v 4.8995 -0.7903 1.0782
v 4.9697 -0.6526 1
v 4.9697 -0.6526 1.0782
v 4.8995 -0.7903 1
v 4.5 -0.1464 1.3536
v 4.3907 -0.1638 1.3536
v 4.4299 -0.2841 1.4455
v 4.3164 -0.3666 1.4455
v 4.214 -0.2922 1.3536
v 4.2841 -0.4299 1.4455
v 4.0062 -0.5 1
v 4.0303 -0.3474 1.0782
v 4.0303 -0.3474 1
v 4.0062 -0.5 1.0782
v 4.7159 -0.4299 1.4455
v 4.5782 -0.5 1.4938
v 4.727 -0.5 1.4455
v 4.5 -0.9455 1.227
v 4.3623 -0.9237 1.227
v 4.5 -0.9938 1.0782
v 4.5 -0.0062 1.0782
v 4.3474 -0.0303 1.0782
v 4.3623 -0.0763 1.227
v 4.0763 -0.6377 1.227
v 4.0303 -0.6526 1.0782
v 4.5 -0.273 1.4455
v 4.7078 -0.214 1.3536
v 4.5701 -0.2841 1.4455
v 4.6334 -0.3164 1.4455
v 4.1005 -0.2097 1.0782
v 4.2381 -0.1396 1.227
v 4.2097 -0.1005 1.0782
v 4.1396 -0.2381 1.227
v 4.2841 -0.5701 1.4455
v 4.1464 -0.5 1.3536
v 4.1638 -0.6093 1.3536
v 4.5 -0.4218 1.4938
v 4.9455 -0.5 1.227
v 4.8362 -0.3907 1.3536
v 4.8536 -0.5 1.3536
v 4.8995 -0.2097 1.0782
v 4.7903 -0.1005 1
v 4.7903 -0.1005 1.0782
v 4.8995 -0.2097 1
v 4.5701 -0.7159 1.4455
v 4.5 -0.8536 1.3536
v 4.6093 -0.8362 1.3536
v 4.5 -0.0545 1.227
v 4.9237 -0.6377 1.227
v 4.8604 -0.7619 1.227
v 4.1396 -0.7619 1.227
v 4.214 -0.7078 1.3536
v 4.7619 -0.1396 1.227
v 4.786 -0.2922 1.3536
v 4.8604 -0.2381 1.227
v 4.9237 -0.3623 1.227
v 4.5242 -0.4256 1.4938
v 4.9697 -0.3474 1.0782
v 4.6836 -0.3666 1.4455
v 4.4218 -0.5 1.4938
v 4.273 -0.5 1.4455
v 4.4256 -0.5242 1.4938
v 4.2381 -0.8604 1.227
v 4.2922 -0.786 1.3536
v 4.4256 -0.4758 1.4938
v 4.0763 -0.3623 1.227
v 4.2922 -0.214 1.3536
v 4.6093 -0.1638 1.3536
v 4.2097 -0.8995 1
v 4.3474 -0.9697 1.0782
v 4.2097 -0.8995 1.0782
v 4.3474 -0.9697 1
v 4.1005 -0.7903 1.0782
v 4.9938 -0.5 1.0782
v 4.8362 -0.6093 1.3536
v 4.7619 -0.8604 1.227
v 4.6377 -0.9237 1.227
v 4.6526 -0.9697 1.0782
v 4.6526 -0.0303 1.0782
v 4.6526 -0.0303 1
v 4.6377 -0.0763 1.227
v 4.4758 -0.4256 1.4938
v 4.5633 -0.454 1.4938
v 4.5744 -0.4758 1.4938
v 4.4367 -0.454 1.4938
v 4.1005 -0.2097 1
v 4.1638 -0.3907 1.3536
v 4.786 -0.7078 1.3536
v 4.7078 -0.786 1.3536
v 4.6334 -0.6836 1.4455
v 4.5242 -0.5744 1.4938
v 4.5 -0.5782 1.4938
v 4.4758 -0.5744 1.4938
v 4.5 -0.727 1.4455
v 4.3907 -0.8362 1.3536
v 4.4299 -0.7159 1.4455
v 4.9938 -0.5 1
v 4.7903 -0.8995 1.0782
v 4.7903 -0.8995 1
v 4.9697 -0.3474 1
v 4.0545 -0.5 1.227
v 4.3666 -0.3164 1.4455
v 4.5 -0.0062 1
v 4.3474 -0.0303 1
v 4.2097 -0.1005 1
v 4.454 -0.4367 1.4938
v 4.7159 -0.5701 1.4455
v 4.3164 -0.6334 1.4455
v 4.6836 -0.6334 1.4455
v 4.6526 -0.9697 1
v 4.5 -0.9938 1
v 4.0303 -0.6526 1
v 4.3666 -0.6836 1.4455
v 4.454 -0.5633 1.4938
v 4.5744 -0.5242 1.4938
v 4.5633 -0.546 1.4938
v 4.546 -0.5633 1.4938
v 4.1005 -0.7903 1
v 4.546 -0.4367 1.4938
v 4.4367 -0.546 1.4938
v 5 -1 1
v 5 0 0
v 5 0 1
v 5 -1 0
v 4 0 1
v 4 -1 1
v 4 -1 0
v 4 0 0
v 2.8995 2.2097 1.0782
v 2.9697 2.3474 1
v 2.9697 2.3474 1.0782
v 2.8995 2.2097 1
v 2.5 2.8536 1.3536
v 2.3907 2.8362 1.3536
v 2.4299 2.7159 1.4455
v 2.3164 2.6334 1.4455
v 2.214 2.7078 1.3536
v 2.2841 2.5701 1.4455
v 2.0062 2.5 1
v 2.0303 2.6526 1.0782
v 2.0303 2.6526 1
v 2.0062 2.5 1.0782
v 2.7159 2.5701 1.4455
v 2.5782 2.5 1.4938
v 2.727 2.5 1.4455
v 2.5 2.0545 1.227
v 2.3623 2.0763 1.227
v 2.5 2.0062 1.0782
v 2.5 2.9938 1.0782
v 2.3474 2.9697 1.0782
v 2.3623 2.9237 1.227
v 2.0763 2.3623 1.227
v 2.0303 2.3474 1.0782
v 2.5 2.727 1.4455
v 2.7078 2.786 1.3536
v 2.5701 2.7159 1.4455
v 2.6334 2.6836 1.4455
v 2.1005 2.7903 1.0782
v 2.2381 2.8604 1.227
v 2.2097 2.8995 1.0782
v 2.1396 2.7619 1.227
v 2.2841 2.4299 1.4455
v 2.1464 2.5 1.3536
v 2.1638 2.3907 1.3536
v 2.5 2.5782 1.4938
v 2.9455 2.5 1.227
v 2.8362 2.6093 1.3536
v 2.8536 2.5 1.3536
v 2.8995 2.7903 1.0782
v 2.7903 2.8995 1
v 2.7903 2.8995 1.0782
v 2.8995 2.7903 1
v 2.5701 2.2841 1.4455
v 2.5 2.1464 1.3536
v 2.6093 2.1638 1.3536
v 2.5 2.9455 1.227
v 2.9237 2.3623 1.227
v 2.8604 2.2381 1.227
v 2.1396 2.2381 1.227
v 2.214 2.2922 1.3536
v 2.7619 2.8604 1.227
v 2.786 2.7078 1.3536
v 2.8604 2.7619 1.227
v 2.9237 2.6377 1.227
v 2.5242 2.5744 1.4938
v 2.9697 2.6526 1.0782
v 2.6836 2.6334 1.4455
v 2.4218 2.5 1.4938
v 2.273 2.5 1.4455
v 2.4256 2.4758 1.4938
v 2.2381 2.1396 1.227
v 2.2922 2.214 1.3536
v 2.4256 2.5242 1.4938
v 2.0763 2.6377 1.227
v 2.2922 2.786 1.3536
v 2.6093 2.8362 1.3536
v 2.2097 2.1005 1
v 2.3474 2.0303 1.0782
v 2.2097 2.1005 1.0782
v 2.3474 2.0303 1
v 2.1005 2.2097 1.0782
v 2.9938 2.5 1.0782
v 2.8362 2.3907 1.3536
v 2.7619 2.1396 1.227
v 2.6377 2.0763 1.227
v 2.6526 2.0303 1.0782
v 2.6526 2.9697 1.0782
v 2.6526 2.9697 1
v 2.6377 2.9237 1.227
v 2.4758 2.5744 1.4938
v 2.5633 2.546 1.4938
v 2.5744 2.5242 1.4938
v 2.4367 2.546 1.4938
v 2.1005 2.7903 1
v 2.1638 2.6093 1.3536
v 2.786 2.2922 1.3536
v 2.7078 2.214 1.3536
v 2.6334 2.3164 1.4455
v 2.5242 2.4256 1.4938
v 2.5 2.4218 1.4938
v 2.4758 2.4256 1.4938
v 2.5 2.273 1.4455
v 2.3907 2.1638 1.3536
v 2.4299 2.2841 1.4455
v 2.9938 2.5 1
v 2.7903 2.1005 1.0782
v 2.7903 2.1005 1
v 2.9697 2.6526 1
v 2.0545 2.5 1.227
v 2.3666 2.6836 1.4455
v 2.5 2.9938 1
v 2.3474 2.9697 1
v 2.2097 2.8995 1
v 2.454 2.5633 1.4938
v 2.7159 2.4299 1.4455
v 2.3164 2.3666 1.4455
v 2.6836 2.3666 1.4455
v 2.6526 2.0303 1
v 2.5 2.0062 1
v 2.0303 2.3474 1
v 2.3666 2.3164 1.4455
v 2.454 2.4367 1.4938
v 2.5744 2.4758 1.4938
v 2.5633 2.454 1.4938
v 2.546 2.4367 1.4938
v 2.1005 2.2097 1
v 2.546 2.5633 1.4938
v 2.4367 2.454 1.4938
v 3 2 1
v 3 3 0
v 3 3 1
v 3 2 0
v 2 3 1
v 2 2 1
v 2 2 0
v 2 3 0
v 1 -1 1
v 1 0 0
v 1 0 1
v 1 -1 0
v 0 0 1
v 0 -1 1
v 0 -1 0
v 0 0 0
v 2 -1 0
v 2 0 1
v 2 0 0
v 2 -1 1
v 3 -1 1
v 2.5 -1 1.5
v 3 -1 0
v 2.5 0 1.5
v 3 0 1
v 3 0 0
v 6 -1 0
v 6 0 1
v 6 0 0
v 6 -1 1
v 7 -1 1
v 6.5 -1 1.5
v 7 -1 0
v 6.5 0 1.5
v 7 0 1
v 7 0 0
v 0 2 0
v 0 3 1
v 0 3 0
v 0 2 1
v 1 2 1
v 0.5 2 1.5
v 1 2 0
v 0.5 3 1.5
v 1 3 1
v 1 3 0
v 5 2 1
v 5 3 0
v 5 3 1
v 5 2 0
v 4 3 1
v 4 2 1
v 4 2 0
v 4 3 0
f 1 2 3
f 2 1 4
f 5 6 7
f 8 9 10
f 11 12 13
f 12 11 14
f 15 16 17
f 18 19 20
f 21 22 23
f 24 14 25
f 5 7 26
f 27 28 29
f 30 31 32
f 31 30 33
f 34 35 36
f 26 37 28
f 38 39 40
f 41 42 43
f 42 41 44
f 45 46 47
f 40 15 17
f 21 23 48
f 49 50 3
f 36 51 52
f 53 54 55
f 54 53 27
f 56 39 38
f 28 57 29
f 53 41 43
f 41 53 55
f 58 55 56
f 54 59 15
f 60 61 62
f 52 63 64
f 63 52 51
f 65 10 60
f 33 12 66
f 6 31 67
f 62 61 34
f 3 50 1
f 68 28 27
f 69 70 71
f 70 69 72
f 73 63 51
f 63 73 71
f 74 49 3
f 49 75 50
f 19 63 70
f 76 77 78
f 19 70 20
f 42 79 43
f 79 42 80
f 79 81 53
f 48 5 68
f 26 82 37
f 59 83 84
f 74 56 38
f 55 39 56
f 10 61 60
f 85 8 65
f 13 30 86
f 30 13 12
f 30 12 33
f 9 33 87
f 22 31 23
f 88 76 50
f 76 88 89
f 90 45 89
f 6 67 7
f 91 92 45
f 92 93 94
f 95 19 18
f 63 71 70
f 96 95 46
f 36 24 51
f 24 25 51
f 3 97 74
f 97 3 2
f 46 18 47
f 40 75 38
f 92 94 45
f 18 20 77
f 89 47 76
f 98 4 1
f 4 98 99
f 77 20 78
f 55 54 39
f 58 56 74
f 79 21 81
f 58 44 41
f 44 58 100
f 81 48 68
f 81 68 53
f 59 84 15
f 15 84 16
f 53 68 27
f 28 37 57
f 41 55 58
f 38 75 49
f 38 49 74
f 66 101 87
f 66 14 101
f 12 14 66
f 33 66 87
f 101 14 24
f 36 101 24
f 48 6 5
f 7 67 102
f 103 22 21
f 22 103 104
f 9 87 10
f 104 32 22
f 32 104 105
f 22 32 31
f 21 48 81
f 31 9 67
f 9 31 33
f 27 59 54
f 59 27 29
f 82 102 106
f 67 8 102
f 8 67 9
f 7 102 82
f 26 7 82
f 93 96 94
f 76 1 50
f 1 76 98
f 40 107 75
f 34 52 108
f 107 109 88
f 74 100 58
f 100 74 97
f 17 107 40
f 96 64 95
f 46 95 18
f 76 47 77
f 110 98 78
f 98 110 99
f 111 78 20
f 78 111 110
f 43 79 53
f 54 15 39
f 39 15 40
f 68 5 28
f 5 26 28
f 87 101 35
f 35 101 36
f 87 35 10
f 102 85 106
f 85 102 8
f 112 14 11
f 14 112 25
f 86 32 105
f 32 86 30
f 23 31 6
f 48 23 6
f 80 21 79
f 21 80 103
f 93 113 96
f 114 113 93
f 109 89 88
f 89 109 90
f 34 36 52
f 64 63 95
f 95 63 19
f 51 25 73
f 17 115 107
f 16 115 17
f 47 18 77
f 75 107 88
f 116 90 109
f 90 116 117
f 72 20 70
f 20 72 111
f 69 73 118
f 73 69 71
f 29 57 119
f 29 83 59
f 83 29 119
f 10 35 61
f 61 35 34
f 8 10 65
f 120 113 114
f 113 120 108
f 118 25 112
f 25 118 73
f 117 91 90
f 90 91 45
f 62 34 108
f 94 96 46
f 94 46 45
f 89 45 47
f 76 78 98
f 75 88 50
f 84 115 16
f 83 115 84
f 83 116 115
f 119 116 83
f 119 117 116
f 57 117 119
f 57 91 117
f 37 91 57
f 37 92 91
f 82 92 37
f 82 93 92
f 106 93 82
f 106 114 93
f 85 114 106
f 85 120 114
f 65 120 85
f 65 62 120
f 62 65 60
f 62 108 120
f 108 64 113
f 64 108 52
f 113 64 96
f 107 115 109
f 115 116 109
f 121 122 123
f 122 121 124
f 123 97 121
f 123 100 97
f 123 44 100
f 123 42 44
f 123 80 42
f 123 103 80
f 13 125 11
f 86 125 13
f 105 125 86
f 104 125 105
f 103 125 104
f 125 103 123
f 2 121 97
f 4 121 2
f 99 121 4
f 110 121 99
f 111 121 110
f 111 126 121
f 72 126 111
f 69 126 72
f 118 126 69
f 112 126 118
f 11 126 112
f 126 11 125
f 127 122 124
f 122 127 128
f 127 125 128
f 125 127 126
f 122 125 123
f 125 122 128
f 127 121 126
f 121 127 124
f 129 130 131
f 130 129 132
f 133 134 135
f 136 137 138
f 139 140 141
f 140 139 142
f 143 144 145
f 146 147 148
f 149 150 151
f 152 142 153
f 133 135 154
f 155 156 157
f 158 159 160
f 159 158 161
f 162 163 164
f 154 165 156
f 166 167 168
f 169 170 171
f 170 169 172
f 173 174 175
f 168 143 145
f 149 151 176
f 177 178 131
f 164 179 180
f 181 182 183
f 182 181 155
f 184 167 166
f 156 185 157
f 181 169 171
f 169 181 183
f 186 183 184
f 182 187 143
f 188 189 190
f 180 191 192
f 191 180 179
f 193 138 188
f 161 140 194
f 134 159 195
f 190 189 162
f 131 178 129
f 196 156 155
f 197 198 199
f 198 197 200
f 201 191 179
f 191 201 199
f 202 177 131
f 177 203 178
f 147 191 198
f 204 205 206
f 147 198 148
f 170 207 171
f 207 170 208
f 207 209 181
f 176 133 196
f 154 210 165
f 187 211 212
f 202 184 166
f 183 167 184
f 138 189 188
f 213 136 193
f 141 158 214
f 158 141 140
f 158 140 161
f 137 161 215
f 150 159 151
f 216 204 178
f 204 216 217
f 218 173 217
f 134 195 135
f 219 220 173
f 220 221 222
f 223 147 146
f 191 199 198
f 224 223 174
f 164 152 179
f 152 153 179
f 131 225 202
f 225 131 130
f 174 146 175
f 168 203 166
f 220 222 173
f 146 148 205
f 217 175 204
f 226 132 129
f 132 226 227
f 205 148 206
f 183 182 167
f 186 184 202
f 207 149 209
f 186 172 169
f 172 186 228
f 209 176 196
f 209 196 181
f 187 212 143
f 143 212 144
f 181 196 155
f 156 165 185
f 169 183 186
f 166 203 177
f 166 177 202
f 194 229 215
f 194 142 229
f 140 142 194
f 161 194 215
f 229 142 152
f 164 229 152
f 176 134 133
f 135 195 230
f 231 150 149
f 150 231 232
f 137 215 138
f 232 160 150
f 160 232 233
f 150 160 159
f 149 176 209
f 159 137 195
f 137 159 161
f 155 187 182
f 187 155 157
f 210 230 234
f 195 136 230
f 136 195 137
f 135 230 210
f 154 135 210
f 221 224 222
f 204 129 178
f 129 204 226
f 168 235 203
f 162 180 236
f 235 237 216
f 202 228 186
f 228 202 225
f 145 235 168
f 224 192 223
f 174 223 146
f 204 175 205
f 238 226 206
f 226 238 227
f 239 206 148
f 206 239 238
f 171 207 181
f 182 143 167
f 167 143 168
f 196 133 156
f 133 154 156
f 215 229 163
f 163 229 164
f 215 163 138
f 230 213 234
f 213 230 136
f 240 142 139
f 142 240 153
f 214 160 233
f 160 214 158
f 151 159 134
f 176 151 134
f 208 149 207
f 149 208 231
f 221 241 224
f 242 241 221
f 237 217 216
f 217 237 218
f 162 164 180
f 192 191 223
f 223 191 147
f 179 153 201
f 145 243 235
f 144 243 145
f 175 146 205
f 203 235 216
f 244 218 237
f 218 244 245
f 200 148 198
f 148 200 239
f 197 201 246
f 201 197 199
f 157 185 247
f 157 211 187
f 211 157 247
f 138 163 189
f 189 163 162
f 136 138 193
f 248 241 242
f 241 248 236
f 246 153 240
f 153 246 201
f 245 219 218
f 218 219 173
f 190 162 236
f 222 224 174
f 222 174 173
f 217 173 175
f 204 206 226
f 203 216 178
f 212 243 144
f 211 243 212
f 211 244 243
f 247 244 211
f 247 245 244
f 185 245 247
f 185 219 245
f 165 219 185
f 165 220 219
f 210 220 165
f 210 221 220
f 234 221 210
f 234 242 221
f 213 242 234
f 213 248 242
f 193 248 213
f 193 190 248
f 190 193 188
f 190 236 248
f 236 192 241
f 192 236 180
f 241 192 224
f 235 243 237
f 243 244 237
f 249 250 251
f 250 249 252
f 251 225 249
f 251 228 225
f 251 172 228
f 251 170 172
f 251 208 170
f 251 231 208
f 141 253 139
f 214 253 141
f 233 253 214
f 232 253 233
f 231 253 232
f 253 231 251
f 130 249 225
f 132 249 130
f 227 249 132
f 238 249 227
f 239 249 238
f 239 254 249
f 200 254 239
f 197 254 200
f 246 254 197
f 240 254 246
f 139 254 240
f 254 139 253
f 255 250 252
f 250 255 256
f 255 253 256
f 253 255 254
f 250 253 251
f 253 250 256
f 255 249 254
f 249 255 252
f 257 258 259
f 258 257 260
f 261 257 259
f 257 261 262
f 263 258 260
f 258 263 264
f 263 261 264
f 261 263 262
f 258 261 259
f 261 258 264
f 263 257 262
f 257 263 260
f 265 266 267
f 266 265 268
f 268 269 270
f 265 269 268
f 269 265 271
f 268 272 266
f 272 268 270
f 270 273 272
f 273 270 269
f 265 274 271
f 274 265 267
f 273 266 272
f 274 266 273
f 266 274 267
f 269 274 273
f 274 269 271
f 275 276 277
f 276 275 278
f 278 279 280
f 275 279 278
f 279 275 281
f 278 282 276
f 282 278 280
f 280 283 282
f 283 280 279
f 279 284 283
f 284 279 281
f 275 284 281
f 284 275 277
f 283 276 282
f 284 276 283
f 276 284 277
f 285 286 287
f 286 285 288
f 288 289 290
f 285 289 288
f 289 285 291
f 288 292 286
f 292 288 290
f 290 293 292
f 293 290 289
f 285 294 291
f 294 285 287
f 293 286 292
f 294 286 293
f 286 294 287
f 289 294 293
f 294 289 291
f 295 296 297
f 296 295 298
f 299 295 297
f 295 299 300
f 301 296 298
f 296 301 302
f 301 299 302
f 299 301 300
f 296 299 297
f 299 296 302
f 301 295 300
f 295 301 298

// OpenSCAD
//Enter OpenSCAD code here.
module house(roof="flat",paint=[1,0,0]) 
{ color(paint) if(roof=="flat")
 { translate([0,-1,0]) cube(); } 
else if(roof=="pitched") 
{ rotate([90,0,0]) linear_extrude(height=1) 
polygon(points=[[0,0],[0,1],[0.5,1.5],[1,1],[1,0]]); } 
else if(roof=="domical")
 { translate([0,-1,0])
{ translate([0.5,0.5,1]) sphere(r=0.5,$fn=20); cube(); } } } 
house();
 translate([2,0,0]) house("pitched"); translate([4,0,0]) house("domical",[0,1,0]); translate([6,0,0]) house(roof="pitched",paint=[0,0,1]); translate([0,3,0]) house(paint=[0,0,0],roof="pitched"); translate([2,3,0]) house(roof="domical"); translate([4,3,0]) house(paint=[0,0.5,0.5]);
 echo("Version:",version());
